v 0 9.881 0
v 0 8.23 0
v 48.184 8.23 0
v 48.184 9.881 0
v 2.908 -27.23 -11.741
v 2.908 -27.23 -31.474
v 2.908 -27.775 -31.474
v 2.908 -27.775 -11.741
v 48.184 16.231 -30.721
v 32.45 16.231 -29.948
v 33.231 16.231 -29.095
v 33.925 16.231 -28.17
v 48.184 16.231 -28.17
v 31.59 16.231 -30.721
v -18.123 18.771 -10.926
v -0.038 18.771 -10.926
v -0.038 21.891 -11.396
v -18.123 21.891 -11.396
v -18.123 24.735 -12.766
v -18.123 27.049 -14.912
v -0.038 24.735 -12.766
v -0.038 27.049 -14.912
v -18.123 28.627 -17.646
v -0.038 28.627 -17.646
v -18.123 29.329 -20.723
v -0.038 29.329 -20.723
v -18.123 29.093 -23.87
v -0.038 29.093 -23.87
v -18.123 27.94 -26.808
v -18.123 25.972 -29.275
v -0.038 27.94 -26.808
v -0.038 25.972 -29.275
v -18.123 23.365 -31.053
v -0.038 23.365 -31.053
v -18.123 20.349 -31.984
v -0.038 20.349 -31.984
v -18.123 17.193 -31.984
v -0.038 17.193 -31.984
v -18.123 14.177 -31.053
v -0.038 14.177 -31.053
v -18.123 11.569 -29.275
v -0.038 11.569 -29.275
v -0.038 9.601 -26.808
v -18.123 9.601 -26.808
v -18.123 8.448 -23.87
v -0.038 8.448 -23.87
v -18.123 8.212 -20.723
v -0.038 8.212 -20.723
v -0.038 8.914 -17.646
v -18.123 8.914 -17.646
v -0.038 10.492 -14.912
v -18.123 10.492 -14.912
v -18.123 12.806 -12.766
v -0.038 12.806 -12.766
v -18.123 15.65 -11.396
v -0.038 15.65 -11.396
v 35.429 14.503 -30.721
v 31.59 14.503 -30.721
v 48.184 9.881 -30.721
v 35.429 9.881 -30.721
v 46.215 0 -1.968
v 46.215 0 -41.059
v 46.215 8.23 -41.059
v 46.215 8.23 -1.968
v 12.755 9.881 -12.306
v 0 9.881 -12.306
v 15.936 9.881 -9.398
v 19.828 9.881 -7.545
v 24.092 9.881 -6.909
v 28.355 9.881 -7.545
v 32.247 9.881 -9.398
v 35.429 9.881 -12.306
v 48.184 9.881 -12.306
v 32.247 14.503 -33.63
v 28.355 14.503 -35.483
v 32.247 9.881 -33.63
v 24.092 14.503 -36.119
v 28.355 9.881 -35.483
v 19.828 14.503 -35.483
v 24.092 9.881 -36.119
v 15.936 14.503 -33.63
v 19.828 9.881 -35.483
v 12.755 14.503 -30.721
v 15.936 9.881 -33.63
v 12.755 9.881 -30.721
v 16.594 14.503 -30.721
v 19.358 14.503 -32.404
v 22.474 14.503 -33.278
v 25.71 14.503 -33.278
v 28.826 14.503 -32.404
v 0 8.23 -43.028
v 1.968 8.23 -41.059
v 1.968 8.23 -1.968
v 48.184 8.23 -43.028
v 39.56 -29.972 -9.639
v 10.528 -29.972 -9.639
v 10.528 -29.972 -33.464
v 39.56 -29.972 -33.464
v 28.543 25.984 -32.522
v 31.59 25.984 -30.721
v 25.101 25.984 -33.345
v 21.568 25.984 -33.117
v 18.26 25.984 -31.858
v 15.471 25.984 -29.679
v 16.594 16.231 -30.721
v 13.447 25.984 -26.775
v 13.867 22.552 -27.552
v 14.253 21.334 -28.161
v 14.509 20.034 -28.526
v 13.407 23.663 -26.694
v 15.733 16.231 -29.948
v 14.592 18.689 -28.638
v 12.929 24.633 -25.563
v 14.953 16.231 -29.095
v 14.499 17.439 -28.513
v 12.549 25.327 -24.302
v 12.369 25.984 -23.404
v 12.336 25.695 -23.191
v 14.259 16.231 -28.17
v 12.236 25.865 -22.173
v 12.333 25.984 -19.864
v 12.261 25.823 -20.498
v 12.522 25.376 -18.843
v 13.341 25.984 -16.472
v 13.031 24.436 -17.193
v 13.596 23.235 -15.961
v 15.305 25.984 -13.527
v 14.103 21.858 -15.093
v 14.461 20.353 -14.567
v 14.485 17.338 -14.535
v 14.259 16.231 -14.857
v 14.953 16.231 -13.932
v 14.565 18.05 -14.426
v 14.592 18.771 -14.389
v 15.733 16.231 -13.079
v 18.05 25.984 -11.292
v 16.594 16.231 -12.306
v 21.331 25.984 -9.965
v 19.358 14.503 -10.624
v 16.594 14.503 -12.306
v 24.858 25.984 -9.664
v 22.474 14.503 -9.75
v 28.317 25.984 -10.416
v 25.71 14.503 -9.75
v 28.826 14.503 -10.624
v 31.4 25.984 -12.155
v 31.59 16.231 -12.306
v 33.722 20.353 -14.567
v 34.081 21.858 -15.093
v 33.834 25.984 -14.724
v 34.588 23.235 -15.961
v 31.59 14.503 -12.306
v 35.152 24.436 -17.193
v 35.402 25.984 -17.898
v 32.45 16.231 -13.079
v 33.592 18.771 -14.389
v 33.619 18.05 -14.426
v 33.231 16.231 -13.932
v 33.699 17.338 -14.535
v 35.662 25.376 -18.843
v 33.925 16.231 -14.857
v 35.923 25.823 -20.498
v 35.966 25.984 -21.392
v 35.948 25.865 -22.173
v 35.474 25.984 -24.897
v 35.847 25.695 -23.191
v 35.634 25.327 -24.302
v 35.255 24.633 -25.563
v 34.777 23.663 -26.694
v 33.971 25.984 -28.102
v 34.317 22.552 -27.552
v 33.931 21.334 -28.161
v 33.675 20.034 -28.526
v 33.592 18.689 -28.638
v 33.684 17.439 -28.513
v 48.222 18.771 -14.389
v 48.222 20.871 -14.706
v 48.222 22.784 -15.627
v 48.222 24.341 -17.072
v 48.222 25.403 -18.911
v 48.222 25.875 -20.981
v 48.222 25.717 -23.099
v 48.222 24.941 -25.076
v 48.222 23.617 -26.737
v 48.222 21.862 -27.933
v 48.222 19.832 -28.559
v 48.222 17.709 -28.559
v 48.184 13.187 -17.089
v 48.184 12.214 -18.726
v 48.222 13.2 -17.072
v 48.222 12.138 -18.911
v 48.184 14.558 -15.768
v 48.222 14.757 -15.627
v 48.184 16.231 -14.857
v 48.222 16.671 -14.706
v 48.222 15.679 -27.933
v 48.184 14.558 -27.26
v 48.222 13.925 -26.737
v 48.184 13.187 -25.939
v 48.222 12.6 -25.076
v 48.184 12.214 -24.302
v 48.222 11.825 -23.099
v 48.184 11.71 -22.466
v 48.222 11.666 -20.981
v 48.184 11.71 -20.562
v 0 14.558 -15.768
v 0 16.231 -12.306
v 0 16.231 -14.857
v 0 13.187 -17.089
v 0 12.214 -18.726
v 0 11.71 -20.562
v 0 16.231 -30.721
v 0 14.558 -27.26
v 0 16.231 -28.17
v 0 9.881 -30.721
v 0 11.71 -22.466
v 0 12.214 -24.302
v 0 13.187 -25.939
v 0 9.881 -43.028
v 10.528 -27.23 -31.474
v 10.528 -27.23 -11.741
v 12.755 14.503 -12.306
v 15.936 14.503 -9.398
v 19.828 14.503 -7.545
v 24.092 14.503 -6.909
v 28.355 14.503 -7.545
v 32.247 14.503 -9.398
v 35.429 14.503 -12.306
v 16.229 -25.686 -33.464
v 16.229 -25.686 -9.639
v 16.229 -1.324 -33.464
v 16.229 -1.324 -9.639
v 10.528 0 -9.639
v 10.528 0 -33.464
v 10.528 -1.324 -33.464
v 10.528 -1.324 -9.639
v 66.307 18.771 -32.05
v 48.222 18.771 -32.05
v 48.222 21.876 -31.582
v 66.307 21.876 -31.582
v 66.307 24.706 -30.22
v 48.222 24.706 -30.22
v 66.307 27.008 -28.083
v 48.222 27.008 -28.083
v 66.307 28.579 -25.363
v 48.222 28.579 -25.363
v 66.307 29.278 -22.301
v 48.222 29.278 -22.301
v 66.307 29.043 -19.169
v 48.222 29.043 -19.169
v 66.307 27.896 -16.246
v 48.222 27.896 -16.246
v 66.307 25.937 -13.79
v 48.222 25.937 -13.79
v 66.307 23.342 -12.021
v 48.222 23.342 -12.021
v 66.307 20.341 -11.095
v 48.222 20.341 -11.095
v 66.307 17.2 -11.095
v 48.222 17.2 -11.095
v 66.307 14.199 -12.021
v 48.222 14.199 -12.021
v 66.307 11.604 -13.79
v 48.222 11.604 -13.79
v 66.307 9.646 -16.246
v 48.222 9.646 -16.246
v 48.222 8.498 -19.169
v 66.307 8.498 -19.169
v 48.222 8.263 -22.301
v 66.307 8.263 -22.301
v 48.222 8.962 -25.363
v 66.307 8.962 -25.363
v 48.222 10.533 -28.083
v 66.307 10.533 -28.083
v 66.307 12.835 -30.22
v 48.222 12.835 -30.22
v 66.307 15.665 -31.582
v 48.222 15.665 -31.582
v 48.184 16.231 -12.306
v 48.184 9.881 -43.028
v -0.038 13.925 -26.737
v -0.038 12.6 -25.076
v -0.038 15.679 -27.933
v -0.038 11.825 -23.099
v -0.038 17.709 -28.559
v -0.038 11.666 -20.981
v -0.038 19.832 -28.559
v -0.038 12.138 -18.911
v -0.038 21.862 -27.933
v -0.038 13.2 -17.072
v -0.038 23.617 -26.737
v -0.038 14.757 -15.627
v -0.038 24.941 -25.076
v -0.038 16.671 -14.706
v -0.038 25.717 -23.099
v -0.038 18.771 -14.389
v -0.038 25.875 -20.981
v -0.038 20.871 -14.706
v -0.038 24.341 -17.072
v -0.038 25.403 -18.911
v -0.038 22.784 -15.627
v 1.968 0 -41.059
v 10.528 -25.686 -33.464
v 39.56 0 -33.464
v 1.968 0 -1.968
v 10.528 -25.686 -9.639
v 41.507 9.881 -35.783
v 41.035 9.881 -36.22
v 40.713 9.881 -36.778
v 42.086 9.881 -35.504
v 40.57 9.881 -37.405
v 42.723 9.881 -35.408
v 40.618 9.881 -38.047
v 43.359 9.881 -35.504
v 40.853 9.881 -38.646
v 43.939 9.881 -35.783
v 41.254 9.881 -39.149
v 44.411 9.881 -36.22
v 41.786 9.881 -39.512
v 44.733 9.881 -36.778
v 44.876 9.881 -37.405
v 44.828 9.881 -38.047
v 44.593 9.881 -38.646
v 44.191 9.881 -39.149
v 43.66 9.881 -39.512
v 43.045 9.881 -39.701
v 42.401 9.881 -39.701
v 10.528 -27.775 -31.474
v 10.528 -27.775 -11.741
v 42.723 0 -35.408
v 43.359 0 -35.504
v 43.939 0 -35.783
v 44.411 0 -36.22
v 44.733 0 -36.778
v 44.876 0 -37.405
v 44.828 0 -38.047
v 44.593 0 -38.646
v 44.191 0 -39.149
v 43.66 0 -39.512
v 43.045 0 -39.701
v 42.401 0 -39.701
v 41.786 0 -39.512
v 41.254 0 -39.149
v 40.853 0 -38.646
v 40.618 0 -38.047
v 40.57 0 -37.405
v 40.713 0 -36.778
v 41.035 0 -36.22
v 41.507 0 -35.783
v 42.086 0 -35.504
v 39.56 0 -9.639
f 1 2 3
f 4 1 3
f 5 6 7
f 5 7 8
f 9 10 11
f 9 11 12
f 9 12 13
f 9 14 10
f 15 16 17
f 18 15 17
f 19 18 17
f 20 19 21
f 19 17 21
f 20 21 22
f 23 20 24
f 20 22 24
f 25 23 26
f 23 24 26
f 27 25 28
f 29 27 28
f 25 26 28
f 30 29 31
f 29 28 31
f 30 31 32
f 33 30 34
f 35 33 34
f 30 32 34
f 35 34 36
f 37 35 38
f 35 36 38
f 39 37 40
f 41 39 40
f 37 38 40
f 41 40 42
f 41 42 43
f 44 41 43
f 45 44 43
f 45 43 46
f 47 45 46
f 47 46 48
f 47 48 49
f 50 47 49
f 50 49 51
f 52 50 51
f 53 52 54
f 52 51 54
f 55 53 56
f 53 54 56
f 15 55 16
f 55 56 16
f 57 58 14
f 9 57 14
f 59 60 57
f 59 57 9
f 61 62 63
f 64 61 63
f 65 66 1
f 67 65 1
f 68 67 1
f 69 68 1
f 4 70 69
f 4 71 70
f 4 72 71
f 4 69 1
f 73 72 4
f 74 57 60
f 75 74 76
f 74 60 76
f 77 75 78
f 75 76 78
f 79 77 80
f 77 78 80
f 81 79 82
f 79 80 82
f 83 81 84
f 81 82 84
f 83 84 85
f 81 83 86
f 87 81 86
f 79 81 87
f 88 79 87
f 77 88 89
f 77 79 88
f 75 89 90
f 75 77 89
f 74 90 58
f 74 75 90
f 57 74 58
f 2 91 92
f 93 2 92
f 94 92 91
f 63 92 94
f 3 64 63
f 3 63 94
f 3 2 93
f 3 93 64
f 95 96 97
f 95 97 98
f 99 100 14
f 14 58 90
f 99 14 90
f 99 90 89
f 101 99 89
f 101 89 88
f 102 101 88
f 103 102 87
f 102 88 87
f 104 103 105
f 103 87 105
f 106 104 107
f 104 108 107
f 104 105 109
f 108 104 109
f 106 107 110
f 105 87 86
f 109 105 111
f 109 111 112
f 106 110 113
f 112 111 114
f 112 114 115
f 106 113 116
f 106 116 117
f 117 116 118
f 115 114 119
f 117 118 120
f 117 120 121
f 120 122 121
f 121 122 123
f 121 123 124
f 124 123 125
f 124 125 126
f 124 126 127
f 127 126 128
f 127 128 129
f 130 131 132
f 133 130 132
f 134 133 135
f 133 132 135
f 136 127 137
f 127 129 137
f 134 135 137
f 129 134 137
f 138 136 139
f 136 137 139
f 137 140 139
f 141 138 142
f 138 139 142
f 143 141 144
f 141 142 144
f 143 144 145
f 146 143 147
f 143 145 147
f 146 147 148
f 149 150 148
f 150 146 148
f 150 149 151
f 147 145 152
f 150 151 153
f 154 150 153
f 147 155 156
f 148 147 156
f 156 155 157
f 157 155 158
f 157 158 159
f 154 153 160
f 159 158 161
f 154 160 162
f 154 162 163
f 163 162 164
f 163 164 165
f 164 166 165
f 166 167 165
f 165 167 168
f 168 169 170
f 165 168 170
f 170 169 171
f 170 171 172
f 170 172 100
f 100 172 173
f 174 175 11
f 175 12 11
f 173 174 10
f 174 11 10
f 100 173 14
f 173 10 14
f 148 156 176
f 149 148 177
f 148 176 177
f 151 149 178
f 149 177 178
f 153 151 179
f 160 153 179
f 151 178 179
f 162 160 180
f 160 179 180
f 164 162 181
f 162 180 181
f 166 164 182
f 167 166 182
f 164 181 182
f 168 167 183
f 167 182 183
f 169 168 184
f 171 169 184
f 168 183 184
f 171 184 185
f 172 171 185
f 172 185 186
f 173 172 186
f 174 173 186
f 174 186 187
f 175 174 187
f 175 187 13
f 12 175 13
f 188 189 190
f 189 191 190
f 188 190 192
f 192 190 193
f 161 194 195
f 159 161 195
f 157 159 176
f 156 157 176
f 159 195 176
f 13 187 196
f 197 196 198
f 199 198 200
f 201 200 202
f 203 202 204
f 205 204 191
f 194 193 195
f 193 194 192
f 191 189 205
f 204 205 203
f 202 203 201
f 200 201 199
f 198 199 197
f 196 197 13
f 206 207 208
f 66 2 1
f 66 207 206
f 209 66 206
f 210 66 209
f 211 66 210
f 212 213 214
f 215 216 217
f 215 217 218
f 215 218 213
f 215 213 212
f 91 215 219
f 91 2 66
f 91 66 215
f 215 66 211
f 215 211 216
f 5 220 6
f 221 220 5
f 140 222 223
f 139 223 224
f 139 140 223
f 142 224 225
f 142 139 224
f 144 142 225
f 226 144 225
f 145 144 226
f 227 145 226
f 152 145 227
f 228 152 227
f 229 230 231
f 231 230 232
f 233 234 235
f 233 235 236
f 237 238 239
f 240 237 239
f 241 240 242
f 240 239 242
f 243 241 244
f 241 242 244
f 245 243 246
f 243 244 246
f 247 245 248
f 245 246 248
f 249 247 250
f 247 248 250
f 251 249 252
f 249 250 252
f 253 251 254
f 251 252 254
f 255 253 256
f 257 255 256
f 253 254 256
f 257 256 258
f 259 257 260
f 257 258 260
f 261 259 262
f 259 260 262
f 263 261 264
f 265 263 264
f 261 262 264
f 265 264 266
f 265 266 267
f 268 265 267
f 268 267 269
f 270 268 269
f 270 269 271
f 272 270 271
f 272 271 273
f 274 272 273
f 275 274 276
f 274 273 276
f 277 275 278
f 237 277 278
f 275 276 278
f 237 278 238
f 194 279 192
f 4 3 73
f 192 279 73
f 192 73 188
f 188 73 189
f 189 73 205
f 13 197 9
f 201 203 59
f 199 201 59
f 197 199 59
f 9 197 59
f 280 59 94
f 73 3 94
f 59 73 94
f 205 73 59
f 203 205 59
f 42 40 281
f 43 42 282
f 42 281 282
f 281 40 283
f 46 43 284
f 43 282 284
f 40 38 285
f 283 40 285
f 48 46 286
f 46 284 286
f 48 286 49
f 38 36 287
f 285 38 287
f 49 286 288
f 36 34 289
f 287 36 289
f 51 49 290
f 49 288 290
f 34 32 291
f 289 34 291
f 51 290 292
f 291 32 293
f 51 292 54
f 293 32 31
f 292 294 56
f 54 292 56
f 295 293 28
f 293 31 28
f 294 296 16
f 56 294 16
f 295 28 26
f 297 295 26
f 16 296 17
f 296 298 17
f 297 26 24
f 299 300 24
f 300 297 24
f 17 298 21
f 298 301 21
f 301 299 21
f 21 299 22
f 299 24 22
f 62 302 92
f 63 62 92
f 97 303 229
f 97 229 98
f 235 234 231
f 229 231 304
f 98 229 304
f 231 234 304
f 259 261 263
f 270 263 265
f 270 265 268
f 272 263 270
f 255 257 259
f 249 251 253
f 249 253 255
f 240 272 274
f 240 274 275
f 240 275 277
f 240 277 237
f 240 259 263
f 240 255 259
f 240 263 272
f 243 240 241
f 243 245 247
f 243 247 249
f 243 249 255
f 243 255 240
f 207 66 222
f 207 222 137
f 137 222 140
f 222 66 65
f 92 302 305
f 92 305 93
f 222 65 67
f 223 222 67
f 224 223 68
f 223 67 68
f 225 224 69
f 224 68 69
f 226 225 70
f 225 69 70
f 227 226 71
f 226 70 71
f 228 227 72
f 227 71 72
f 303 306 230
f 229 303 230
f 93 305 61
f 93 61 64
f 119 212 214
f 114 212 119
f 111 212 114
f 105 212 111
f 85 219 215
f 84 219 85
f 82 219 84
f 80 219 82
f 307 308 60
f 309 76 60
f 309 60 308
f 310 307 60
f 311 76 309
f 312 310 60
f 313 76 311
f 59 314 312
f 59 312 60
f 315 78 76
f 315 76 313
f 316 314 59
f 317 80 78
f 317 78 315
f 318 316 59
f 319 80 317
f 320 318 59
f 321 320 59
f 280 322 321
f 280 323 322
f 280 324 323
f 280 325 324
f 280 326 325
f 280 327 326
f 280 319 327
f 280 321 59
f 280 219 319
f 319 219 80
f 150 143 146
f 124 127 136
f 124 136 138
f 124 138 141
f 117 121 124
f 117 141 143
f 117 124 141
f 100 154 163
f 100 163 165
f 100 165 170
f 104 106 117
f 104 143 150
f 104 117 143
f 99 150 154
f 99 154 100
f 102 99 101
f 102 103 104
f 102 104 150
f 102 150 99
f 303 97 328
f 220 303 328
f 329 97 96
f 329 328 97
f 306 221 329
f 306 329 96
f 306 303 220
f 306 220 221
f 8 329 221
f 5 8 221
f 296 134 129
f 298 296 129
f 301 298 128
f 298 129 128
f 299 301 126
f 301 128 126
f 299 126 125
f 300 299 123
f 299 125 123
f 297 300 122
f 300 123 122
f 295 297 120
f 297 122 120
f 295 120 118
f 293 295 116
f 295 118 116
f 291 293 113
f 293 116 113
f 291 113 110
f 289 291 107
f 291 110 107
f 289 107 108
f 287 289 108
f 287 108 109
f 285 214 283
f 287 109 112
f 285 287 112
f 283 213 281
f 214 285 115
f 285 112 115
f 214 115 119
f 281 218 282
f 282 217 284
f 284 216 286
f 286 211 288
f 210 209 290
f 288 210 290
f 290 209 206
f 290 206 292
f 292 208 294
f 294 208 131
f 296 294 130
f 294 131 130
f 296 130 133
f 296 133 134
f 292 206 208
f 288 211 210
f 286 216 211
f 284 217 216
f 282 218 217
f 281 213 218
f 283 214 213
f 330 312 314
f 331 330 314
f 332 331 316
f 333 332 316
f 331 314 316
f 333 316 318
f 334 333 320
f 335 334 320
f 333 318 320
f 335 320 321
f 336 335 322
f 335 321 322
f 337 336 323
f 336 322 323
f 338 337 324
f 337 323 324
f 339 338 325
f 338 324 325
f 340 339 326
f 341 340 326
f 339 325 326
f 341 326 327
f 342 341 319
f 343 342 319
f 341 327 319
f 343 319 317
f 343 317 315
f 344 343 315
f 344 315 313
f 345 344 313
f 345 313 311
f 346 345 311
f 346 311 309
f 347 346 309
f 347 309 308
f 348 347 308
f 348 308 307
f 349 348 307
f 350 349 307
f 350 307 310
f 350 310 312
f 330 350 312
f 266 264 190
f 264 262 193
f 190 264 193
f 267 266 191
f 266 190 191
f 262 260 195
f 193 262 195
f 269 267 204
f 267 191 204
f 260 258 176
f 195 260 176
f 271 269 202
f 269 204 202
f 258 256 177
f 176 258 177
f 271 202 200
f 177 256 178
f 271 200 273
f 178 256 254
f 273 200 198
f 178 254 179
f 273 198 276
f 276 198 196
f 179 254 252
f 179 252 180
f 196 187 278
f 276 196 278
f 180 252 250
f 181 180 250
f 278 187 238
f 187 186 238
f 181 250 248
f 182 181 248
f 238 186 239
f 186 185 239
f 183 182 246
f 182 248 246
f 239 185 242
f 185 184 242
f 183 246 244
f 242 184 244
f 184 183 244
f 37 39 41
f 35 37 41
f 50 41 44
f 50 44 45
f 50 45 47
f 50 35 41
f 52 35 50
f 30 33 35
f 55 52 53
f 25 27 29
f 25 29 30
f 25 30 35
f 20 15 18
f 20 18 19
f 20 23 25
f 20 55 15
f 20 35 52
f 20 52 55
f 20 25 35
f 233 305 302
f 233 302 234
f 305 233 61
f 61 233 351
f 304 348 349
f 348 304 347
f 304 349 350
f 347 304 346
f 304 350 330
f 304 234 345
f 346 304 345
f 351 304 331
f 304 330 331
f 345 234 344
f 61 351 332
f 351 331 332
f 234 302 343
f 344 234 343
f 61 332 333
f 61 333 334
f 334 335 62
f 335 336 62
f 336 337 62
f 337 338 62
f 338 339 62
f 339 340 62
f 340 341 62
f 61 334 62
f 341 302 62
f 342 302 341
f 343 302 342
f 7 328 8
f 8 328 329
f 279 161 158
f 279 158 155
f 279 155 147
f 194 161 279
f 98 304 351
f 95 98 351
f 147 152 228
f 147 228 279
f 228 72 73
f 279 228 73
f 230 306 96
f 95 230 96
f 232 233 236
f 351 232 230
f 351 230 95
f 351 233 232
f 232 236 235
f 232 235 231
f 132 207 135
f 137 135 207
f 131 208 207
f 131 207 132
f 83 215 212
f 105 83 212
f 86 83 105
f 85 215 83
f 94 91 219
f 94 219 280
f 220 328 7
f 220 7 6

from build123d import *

# Parameters (mm, degrees)
SKETCH1_W                = 48.1838
SKETCH1_H                = 43.0276
BOSS_EXTRUDE1_DEPTH      = 9.8806
SKETCH2_W                = 1.9685
SKETCH2_H                = 8.2296
CUT_EXTRUDE1_DEPTH       = 66.350433821
SKETCH4_W                = 1.9685
SKETCH4_H                = 8.2296
CUT_EXTRUDE2_DEPTH       = 65.071479861
SKETCH7_W                = 2.93146275
SKETCH7_H                = 2.802785647
BOSS_EXTRUDE2_DEPTH      = 8.89
BOSS_EXTRUDE3_DEPTH      = 24.13
BOSS_EXTRUDE3_DEPTH_BACK = 24.13
SKETCH8_R                = 7.1247
SKETCH9_W                = 48.1838
SKETCH9_H                = 18.415
BOSS_EXTRUDE4_DEPTH      = 6.35
SKETCH10_R               = 10.536568217
BOSS_EXTRUDE5_DEPTH      = 18.0848
SKETCH11_R               = 10.588095361
BOSS_EXTRUDE6_DEPTH      = 18.0848
SKETCH12_W               = 3.635847489
SKETCH12_H               = 2.34172836
CUT_EXTRUDE3_DEPTH       = 79.754744187
SKETCH14_W               = 3.684147677
SKETCH14_H               = 13.068356619
CUT_EXTRUDE4_DEPTH       = 79.754744187
SKETCH15_R               = 14.605
BOSS_EXTRUDE7_DEPTH      = 4.6228
SKETCH16_R               = 11.8745
BOSS_EXTRUDE8_DEPTH      = 11.4808
SKETCH18_R               = 2.159
CUT_EXTRUDE5_DEPTH       = 11.4808
SKETCH19_W               = 29.0322
SKETCH19_H               = 23.8252
BOSS_EXTRUDE9_DEPTH      = 29.972
SKETCH20_W               = 5.701054359
SKETCH20_H               = 24.361747341
CUT_EXTRUDE6_DEPTH       = 29.972
SKETCH21_W               = 19.733319163
SKETCH21_H               = 0.544777799
BOSS_EXTRUDE10_DEPTH     = 7.62


with BuildPart() as part:
    # Sketch1 → Boss-Extrude1 (new body)
    with BuildSketch(Plane(origin=(0, 0, 0), x_dir=(1, 0, 0), z_dir=(0, 1, 0))):
        with Locations((24.0919, 21.5138)):
            Rectangle(SKETCH1_W, SKETCH1_H)
    extrude(amount=BOSS_EXTRUDE1_DEPTH)

    # Sketch2 → Cut-Extrude1 (cut, through all)
    with BuildSketch(Plane(origin=(48.1838, 0, 0), x_dir=(0, 0, -1), z_dir=(1, 0, 0))):
        with Locations((42.04335, 4.1148)):
            Rectangle(SKETCH2_W, SKETCH2_H)
        with Locations((0.98425, 4.1148)):
            Rectangle(SKETCH2_W, SKETCH2_H)
    extrude(amount=-CUT_EXTRUDE1_DEPTH, mode=Mode.SUBTRACT)

    # Sketch4 → Cut-Extrude2 (cut, through all)
    with BuildSketch(Plane.XY.offset(-1.9685)):
        with Locations((0.98425, 4.1148)):
            Rectangle(SKETCH4_W, SKETCH4_H)
        with Locations((47.19955, 4.1148)):
            Rectangle(SKETCH4_W, SKETCH4_H)
    extrude(amount=-CUT_EXTRUDE2_DEPTH, mode=Mode.SUBTRACT)

    # Sketch7 → Boss-Extrude2 (add)
    with BuildSketch(Plane(origin=(0, 9.8806, 0), x_dir=(1, 0, 0), z_dir=(0, 1, 0))):
        with Locations((25.557631375, 20.112407176)):
            Rectangle(SKETCH7_W, SKETCH7_H)
    extrude(amount=BOSS_EXTRUDE2_DEPTH)

    # Sketch8 → Boss-Extrude3 (add, two sides: drawn at the far end of the back side and taken through both)
    with BuildSketch(Plane.ZY.offset(-24.0919).offset(-BOSS_EXTRUDE3_DEPTH_BACK)):
        with Locations((-21.5138, 18.7706)):
            Circle(SKETCH8_R)
    extrude(amount=BOSS_EXTRUDE3_DEPTH + BOSS_EXTRUDE3_DEPTH_BACK)

    # Sketch9 → Boss-Extrude4 (add)
    with BuildSketch(Plane(origin=(0, 9.8806, 0), x_dir=(1, 0, 0), z_dir=(0, 1, 0))):
        with Locations((24.0919, 21.5138)):
            Rectangle(SKETCH9_W, SKETCH9_H)
    extrude(amount=BOSS_EXTRUDE4_DEPTH)

    # Sketch10 → Boss-Extrude5 (add)
    with BuildSketch(Plane(origin=(48.2219, 0, 0), x_dir=(0, 0, -1), z_dir=(1, 0, 0))):
        with Locations((21.5138, 18.7706)):
            Circle(SKETCH10_R)
    extrude(amount=BOSS_EXTRUDE5_DEPTH)

    # Sketch11 → Boss-Extrude6 (add)
    with BuildSketch(Plane.ZY.offset(0.0381)):
        with Locations((-21.5138, 18.7706)):
            Circle(SKETCH11_R)
    extrude(amount=BOSS_EXTRUDE6_DEPTH)

    # Sketch12 → Cut-Extrude3 (cut, through all)
    with BuildSketch(Plane.XY.offset(-12.3063)):
        with Locations((25.909823745, 11.05146418)):
            Rectangle(SKETCH12_W, SKETCH12_H)
    extrude(amount=-CUT_EXTRUDE3_DEPTH, mode=Mode.SUBTRACT)

    # Sketch14 → Cut-Extrude4 (cut, through all)
    with BuildSketch(Plane.XY.offset(-12.3063)):
        with Locations((25.933973839, 18.75650667)):
            Rectangle(SKETCH14_W, SKETCH14_H)
    extrude(amount=-CUT_EXTRUDE4_DEPTH, mode=Mode.SUBTRACT)

    # Sketch15 → Boss-Extrude7 (add)
    with BuildSketch(Plane(origin=(0, 9.8806, 0), x_dir=(1, 0, 0), z_dir=(0, 1, 0))):
        with Locations((24.0919, 21.5138)):
            Circle(SKETCH15_R)
    extrude(amount=BOSS_EXTRUDE7_DEPTH)

    # Sketch16 → Boss-Extrude8 (add)
    with BuildSketch(Plane(origin=(0, 14.5034, 0), x_dir=(1, 0, 0), z_dir=(0, 1, 0))):
        with Locations(Location((24.0919, 21.5138, 0), (0, 0, 50.84140908))):
            Circle(SKETCH16_R)
    extrude(amount=BOSS_EXTRUDE8_DEPTH)

    # Sketch18 → Cut-Extrude5 (cut)
    with BuildSketch(Plane(origin=(0, 9.8806, 0), x_dir=(1, 0, 0), z_dir=(0, 1, 0))):
        with Locations(Location((42.7228, 37.5666, 0), (0, 0, 270))):
            Circle(SKETCH18_R)
    extrude(amount=-CUT_EXTRUDE5_DEPTH, mode=Mode.SUBTRACT)

    # Sketch19 → Boss-Extrude9 (add)
    with BuildSketch(Plane.XZ):
        with Locations((25.0444, -21.5519)):
            Rectangle(SKETCH19_W, SKETCH19_H)
    extrude(amount=BOSS_EXTRUDE9_DEPTH)

    # Sketch20 → Cut-Extrude6 (cut)
    with BuildSketch(Plane.XY.offset(-9.6393)):
        with Locations((13.378827179, -13.505025304)):
            Rectangle(SKETCH20_W, SKETCH20_H)
    extrude(amount=-CUT_EXTRUDE6_DEPTH, mode=Mode.SUBTRACT)

    # Sketch21 → Boss-Extrude10 (add)
    with BuildSketch(Plane.ZY.offset(-10.5283)):
        with Locations((-21.607385296, -27.502260314)):
            Rectangle(SKETCH21_W, SKETCH21_H)
    extrude(amount=BOSS_EXTRUDE10_DEPTH)


solid = part.part
